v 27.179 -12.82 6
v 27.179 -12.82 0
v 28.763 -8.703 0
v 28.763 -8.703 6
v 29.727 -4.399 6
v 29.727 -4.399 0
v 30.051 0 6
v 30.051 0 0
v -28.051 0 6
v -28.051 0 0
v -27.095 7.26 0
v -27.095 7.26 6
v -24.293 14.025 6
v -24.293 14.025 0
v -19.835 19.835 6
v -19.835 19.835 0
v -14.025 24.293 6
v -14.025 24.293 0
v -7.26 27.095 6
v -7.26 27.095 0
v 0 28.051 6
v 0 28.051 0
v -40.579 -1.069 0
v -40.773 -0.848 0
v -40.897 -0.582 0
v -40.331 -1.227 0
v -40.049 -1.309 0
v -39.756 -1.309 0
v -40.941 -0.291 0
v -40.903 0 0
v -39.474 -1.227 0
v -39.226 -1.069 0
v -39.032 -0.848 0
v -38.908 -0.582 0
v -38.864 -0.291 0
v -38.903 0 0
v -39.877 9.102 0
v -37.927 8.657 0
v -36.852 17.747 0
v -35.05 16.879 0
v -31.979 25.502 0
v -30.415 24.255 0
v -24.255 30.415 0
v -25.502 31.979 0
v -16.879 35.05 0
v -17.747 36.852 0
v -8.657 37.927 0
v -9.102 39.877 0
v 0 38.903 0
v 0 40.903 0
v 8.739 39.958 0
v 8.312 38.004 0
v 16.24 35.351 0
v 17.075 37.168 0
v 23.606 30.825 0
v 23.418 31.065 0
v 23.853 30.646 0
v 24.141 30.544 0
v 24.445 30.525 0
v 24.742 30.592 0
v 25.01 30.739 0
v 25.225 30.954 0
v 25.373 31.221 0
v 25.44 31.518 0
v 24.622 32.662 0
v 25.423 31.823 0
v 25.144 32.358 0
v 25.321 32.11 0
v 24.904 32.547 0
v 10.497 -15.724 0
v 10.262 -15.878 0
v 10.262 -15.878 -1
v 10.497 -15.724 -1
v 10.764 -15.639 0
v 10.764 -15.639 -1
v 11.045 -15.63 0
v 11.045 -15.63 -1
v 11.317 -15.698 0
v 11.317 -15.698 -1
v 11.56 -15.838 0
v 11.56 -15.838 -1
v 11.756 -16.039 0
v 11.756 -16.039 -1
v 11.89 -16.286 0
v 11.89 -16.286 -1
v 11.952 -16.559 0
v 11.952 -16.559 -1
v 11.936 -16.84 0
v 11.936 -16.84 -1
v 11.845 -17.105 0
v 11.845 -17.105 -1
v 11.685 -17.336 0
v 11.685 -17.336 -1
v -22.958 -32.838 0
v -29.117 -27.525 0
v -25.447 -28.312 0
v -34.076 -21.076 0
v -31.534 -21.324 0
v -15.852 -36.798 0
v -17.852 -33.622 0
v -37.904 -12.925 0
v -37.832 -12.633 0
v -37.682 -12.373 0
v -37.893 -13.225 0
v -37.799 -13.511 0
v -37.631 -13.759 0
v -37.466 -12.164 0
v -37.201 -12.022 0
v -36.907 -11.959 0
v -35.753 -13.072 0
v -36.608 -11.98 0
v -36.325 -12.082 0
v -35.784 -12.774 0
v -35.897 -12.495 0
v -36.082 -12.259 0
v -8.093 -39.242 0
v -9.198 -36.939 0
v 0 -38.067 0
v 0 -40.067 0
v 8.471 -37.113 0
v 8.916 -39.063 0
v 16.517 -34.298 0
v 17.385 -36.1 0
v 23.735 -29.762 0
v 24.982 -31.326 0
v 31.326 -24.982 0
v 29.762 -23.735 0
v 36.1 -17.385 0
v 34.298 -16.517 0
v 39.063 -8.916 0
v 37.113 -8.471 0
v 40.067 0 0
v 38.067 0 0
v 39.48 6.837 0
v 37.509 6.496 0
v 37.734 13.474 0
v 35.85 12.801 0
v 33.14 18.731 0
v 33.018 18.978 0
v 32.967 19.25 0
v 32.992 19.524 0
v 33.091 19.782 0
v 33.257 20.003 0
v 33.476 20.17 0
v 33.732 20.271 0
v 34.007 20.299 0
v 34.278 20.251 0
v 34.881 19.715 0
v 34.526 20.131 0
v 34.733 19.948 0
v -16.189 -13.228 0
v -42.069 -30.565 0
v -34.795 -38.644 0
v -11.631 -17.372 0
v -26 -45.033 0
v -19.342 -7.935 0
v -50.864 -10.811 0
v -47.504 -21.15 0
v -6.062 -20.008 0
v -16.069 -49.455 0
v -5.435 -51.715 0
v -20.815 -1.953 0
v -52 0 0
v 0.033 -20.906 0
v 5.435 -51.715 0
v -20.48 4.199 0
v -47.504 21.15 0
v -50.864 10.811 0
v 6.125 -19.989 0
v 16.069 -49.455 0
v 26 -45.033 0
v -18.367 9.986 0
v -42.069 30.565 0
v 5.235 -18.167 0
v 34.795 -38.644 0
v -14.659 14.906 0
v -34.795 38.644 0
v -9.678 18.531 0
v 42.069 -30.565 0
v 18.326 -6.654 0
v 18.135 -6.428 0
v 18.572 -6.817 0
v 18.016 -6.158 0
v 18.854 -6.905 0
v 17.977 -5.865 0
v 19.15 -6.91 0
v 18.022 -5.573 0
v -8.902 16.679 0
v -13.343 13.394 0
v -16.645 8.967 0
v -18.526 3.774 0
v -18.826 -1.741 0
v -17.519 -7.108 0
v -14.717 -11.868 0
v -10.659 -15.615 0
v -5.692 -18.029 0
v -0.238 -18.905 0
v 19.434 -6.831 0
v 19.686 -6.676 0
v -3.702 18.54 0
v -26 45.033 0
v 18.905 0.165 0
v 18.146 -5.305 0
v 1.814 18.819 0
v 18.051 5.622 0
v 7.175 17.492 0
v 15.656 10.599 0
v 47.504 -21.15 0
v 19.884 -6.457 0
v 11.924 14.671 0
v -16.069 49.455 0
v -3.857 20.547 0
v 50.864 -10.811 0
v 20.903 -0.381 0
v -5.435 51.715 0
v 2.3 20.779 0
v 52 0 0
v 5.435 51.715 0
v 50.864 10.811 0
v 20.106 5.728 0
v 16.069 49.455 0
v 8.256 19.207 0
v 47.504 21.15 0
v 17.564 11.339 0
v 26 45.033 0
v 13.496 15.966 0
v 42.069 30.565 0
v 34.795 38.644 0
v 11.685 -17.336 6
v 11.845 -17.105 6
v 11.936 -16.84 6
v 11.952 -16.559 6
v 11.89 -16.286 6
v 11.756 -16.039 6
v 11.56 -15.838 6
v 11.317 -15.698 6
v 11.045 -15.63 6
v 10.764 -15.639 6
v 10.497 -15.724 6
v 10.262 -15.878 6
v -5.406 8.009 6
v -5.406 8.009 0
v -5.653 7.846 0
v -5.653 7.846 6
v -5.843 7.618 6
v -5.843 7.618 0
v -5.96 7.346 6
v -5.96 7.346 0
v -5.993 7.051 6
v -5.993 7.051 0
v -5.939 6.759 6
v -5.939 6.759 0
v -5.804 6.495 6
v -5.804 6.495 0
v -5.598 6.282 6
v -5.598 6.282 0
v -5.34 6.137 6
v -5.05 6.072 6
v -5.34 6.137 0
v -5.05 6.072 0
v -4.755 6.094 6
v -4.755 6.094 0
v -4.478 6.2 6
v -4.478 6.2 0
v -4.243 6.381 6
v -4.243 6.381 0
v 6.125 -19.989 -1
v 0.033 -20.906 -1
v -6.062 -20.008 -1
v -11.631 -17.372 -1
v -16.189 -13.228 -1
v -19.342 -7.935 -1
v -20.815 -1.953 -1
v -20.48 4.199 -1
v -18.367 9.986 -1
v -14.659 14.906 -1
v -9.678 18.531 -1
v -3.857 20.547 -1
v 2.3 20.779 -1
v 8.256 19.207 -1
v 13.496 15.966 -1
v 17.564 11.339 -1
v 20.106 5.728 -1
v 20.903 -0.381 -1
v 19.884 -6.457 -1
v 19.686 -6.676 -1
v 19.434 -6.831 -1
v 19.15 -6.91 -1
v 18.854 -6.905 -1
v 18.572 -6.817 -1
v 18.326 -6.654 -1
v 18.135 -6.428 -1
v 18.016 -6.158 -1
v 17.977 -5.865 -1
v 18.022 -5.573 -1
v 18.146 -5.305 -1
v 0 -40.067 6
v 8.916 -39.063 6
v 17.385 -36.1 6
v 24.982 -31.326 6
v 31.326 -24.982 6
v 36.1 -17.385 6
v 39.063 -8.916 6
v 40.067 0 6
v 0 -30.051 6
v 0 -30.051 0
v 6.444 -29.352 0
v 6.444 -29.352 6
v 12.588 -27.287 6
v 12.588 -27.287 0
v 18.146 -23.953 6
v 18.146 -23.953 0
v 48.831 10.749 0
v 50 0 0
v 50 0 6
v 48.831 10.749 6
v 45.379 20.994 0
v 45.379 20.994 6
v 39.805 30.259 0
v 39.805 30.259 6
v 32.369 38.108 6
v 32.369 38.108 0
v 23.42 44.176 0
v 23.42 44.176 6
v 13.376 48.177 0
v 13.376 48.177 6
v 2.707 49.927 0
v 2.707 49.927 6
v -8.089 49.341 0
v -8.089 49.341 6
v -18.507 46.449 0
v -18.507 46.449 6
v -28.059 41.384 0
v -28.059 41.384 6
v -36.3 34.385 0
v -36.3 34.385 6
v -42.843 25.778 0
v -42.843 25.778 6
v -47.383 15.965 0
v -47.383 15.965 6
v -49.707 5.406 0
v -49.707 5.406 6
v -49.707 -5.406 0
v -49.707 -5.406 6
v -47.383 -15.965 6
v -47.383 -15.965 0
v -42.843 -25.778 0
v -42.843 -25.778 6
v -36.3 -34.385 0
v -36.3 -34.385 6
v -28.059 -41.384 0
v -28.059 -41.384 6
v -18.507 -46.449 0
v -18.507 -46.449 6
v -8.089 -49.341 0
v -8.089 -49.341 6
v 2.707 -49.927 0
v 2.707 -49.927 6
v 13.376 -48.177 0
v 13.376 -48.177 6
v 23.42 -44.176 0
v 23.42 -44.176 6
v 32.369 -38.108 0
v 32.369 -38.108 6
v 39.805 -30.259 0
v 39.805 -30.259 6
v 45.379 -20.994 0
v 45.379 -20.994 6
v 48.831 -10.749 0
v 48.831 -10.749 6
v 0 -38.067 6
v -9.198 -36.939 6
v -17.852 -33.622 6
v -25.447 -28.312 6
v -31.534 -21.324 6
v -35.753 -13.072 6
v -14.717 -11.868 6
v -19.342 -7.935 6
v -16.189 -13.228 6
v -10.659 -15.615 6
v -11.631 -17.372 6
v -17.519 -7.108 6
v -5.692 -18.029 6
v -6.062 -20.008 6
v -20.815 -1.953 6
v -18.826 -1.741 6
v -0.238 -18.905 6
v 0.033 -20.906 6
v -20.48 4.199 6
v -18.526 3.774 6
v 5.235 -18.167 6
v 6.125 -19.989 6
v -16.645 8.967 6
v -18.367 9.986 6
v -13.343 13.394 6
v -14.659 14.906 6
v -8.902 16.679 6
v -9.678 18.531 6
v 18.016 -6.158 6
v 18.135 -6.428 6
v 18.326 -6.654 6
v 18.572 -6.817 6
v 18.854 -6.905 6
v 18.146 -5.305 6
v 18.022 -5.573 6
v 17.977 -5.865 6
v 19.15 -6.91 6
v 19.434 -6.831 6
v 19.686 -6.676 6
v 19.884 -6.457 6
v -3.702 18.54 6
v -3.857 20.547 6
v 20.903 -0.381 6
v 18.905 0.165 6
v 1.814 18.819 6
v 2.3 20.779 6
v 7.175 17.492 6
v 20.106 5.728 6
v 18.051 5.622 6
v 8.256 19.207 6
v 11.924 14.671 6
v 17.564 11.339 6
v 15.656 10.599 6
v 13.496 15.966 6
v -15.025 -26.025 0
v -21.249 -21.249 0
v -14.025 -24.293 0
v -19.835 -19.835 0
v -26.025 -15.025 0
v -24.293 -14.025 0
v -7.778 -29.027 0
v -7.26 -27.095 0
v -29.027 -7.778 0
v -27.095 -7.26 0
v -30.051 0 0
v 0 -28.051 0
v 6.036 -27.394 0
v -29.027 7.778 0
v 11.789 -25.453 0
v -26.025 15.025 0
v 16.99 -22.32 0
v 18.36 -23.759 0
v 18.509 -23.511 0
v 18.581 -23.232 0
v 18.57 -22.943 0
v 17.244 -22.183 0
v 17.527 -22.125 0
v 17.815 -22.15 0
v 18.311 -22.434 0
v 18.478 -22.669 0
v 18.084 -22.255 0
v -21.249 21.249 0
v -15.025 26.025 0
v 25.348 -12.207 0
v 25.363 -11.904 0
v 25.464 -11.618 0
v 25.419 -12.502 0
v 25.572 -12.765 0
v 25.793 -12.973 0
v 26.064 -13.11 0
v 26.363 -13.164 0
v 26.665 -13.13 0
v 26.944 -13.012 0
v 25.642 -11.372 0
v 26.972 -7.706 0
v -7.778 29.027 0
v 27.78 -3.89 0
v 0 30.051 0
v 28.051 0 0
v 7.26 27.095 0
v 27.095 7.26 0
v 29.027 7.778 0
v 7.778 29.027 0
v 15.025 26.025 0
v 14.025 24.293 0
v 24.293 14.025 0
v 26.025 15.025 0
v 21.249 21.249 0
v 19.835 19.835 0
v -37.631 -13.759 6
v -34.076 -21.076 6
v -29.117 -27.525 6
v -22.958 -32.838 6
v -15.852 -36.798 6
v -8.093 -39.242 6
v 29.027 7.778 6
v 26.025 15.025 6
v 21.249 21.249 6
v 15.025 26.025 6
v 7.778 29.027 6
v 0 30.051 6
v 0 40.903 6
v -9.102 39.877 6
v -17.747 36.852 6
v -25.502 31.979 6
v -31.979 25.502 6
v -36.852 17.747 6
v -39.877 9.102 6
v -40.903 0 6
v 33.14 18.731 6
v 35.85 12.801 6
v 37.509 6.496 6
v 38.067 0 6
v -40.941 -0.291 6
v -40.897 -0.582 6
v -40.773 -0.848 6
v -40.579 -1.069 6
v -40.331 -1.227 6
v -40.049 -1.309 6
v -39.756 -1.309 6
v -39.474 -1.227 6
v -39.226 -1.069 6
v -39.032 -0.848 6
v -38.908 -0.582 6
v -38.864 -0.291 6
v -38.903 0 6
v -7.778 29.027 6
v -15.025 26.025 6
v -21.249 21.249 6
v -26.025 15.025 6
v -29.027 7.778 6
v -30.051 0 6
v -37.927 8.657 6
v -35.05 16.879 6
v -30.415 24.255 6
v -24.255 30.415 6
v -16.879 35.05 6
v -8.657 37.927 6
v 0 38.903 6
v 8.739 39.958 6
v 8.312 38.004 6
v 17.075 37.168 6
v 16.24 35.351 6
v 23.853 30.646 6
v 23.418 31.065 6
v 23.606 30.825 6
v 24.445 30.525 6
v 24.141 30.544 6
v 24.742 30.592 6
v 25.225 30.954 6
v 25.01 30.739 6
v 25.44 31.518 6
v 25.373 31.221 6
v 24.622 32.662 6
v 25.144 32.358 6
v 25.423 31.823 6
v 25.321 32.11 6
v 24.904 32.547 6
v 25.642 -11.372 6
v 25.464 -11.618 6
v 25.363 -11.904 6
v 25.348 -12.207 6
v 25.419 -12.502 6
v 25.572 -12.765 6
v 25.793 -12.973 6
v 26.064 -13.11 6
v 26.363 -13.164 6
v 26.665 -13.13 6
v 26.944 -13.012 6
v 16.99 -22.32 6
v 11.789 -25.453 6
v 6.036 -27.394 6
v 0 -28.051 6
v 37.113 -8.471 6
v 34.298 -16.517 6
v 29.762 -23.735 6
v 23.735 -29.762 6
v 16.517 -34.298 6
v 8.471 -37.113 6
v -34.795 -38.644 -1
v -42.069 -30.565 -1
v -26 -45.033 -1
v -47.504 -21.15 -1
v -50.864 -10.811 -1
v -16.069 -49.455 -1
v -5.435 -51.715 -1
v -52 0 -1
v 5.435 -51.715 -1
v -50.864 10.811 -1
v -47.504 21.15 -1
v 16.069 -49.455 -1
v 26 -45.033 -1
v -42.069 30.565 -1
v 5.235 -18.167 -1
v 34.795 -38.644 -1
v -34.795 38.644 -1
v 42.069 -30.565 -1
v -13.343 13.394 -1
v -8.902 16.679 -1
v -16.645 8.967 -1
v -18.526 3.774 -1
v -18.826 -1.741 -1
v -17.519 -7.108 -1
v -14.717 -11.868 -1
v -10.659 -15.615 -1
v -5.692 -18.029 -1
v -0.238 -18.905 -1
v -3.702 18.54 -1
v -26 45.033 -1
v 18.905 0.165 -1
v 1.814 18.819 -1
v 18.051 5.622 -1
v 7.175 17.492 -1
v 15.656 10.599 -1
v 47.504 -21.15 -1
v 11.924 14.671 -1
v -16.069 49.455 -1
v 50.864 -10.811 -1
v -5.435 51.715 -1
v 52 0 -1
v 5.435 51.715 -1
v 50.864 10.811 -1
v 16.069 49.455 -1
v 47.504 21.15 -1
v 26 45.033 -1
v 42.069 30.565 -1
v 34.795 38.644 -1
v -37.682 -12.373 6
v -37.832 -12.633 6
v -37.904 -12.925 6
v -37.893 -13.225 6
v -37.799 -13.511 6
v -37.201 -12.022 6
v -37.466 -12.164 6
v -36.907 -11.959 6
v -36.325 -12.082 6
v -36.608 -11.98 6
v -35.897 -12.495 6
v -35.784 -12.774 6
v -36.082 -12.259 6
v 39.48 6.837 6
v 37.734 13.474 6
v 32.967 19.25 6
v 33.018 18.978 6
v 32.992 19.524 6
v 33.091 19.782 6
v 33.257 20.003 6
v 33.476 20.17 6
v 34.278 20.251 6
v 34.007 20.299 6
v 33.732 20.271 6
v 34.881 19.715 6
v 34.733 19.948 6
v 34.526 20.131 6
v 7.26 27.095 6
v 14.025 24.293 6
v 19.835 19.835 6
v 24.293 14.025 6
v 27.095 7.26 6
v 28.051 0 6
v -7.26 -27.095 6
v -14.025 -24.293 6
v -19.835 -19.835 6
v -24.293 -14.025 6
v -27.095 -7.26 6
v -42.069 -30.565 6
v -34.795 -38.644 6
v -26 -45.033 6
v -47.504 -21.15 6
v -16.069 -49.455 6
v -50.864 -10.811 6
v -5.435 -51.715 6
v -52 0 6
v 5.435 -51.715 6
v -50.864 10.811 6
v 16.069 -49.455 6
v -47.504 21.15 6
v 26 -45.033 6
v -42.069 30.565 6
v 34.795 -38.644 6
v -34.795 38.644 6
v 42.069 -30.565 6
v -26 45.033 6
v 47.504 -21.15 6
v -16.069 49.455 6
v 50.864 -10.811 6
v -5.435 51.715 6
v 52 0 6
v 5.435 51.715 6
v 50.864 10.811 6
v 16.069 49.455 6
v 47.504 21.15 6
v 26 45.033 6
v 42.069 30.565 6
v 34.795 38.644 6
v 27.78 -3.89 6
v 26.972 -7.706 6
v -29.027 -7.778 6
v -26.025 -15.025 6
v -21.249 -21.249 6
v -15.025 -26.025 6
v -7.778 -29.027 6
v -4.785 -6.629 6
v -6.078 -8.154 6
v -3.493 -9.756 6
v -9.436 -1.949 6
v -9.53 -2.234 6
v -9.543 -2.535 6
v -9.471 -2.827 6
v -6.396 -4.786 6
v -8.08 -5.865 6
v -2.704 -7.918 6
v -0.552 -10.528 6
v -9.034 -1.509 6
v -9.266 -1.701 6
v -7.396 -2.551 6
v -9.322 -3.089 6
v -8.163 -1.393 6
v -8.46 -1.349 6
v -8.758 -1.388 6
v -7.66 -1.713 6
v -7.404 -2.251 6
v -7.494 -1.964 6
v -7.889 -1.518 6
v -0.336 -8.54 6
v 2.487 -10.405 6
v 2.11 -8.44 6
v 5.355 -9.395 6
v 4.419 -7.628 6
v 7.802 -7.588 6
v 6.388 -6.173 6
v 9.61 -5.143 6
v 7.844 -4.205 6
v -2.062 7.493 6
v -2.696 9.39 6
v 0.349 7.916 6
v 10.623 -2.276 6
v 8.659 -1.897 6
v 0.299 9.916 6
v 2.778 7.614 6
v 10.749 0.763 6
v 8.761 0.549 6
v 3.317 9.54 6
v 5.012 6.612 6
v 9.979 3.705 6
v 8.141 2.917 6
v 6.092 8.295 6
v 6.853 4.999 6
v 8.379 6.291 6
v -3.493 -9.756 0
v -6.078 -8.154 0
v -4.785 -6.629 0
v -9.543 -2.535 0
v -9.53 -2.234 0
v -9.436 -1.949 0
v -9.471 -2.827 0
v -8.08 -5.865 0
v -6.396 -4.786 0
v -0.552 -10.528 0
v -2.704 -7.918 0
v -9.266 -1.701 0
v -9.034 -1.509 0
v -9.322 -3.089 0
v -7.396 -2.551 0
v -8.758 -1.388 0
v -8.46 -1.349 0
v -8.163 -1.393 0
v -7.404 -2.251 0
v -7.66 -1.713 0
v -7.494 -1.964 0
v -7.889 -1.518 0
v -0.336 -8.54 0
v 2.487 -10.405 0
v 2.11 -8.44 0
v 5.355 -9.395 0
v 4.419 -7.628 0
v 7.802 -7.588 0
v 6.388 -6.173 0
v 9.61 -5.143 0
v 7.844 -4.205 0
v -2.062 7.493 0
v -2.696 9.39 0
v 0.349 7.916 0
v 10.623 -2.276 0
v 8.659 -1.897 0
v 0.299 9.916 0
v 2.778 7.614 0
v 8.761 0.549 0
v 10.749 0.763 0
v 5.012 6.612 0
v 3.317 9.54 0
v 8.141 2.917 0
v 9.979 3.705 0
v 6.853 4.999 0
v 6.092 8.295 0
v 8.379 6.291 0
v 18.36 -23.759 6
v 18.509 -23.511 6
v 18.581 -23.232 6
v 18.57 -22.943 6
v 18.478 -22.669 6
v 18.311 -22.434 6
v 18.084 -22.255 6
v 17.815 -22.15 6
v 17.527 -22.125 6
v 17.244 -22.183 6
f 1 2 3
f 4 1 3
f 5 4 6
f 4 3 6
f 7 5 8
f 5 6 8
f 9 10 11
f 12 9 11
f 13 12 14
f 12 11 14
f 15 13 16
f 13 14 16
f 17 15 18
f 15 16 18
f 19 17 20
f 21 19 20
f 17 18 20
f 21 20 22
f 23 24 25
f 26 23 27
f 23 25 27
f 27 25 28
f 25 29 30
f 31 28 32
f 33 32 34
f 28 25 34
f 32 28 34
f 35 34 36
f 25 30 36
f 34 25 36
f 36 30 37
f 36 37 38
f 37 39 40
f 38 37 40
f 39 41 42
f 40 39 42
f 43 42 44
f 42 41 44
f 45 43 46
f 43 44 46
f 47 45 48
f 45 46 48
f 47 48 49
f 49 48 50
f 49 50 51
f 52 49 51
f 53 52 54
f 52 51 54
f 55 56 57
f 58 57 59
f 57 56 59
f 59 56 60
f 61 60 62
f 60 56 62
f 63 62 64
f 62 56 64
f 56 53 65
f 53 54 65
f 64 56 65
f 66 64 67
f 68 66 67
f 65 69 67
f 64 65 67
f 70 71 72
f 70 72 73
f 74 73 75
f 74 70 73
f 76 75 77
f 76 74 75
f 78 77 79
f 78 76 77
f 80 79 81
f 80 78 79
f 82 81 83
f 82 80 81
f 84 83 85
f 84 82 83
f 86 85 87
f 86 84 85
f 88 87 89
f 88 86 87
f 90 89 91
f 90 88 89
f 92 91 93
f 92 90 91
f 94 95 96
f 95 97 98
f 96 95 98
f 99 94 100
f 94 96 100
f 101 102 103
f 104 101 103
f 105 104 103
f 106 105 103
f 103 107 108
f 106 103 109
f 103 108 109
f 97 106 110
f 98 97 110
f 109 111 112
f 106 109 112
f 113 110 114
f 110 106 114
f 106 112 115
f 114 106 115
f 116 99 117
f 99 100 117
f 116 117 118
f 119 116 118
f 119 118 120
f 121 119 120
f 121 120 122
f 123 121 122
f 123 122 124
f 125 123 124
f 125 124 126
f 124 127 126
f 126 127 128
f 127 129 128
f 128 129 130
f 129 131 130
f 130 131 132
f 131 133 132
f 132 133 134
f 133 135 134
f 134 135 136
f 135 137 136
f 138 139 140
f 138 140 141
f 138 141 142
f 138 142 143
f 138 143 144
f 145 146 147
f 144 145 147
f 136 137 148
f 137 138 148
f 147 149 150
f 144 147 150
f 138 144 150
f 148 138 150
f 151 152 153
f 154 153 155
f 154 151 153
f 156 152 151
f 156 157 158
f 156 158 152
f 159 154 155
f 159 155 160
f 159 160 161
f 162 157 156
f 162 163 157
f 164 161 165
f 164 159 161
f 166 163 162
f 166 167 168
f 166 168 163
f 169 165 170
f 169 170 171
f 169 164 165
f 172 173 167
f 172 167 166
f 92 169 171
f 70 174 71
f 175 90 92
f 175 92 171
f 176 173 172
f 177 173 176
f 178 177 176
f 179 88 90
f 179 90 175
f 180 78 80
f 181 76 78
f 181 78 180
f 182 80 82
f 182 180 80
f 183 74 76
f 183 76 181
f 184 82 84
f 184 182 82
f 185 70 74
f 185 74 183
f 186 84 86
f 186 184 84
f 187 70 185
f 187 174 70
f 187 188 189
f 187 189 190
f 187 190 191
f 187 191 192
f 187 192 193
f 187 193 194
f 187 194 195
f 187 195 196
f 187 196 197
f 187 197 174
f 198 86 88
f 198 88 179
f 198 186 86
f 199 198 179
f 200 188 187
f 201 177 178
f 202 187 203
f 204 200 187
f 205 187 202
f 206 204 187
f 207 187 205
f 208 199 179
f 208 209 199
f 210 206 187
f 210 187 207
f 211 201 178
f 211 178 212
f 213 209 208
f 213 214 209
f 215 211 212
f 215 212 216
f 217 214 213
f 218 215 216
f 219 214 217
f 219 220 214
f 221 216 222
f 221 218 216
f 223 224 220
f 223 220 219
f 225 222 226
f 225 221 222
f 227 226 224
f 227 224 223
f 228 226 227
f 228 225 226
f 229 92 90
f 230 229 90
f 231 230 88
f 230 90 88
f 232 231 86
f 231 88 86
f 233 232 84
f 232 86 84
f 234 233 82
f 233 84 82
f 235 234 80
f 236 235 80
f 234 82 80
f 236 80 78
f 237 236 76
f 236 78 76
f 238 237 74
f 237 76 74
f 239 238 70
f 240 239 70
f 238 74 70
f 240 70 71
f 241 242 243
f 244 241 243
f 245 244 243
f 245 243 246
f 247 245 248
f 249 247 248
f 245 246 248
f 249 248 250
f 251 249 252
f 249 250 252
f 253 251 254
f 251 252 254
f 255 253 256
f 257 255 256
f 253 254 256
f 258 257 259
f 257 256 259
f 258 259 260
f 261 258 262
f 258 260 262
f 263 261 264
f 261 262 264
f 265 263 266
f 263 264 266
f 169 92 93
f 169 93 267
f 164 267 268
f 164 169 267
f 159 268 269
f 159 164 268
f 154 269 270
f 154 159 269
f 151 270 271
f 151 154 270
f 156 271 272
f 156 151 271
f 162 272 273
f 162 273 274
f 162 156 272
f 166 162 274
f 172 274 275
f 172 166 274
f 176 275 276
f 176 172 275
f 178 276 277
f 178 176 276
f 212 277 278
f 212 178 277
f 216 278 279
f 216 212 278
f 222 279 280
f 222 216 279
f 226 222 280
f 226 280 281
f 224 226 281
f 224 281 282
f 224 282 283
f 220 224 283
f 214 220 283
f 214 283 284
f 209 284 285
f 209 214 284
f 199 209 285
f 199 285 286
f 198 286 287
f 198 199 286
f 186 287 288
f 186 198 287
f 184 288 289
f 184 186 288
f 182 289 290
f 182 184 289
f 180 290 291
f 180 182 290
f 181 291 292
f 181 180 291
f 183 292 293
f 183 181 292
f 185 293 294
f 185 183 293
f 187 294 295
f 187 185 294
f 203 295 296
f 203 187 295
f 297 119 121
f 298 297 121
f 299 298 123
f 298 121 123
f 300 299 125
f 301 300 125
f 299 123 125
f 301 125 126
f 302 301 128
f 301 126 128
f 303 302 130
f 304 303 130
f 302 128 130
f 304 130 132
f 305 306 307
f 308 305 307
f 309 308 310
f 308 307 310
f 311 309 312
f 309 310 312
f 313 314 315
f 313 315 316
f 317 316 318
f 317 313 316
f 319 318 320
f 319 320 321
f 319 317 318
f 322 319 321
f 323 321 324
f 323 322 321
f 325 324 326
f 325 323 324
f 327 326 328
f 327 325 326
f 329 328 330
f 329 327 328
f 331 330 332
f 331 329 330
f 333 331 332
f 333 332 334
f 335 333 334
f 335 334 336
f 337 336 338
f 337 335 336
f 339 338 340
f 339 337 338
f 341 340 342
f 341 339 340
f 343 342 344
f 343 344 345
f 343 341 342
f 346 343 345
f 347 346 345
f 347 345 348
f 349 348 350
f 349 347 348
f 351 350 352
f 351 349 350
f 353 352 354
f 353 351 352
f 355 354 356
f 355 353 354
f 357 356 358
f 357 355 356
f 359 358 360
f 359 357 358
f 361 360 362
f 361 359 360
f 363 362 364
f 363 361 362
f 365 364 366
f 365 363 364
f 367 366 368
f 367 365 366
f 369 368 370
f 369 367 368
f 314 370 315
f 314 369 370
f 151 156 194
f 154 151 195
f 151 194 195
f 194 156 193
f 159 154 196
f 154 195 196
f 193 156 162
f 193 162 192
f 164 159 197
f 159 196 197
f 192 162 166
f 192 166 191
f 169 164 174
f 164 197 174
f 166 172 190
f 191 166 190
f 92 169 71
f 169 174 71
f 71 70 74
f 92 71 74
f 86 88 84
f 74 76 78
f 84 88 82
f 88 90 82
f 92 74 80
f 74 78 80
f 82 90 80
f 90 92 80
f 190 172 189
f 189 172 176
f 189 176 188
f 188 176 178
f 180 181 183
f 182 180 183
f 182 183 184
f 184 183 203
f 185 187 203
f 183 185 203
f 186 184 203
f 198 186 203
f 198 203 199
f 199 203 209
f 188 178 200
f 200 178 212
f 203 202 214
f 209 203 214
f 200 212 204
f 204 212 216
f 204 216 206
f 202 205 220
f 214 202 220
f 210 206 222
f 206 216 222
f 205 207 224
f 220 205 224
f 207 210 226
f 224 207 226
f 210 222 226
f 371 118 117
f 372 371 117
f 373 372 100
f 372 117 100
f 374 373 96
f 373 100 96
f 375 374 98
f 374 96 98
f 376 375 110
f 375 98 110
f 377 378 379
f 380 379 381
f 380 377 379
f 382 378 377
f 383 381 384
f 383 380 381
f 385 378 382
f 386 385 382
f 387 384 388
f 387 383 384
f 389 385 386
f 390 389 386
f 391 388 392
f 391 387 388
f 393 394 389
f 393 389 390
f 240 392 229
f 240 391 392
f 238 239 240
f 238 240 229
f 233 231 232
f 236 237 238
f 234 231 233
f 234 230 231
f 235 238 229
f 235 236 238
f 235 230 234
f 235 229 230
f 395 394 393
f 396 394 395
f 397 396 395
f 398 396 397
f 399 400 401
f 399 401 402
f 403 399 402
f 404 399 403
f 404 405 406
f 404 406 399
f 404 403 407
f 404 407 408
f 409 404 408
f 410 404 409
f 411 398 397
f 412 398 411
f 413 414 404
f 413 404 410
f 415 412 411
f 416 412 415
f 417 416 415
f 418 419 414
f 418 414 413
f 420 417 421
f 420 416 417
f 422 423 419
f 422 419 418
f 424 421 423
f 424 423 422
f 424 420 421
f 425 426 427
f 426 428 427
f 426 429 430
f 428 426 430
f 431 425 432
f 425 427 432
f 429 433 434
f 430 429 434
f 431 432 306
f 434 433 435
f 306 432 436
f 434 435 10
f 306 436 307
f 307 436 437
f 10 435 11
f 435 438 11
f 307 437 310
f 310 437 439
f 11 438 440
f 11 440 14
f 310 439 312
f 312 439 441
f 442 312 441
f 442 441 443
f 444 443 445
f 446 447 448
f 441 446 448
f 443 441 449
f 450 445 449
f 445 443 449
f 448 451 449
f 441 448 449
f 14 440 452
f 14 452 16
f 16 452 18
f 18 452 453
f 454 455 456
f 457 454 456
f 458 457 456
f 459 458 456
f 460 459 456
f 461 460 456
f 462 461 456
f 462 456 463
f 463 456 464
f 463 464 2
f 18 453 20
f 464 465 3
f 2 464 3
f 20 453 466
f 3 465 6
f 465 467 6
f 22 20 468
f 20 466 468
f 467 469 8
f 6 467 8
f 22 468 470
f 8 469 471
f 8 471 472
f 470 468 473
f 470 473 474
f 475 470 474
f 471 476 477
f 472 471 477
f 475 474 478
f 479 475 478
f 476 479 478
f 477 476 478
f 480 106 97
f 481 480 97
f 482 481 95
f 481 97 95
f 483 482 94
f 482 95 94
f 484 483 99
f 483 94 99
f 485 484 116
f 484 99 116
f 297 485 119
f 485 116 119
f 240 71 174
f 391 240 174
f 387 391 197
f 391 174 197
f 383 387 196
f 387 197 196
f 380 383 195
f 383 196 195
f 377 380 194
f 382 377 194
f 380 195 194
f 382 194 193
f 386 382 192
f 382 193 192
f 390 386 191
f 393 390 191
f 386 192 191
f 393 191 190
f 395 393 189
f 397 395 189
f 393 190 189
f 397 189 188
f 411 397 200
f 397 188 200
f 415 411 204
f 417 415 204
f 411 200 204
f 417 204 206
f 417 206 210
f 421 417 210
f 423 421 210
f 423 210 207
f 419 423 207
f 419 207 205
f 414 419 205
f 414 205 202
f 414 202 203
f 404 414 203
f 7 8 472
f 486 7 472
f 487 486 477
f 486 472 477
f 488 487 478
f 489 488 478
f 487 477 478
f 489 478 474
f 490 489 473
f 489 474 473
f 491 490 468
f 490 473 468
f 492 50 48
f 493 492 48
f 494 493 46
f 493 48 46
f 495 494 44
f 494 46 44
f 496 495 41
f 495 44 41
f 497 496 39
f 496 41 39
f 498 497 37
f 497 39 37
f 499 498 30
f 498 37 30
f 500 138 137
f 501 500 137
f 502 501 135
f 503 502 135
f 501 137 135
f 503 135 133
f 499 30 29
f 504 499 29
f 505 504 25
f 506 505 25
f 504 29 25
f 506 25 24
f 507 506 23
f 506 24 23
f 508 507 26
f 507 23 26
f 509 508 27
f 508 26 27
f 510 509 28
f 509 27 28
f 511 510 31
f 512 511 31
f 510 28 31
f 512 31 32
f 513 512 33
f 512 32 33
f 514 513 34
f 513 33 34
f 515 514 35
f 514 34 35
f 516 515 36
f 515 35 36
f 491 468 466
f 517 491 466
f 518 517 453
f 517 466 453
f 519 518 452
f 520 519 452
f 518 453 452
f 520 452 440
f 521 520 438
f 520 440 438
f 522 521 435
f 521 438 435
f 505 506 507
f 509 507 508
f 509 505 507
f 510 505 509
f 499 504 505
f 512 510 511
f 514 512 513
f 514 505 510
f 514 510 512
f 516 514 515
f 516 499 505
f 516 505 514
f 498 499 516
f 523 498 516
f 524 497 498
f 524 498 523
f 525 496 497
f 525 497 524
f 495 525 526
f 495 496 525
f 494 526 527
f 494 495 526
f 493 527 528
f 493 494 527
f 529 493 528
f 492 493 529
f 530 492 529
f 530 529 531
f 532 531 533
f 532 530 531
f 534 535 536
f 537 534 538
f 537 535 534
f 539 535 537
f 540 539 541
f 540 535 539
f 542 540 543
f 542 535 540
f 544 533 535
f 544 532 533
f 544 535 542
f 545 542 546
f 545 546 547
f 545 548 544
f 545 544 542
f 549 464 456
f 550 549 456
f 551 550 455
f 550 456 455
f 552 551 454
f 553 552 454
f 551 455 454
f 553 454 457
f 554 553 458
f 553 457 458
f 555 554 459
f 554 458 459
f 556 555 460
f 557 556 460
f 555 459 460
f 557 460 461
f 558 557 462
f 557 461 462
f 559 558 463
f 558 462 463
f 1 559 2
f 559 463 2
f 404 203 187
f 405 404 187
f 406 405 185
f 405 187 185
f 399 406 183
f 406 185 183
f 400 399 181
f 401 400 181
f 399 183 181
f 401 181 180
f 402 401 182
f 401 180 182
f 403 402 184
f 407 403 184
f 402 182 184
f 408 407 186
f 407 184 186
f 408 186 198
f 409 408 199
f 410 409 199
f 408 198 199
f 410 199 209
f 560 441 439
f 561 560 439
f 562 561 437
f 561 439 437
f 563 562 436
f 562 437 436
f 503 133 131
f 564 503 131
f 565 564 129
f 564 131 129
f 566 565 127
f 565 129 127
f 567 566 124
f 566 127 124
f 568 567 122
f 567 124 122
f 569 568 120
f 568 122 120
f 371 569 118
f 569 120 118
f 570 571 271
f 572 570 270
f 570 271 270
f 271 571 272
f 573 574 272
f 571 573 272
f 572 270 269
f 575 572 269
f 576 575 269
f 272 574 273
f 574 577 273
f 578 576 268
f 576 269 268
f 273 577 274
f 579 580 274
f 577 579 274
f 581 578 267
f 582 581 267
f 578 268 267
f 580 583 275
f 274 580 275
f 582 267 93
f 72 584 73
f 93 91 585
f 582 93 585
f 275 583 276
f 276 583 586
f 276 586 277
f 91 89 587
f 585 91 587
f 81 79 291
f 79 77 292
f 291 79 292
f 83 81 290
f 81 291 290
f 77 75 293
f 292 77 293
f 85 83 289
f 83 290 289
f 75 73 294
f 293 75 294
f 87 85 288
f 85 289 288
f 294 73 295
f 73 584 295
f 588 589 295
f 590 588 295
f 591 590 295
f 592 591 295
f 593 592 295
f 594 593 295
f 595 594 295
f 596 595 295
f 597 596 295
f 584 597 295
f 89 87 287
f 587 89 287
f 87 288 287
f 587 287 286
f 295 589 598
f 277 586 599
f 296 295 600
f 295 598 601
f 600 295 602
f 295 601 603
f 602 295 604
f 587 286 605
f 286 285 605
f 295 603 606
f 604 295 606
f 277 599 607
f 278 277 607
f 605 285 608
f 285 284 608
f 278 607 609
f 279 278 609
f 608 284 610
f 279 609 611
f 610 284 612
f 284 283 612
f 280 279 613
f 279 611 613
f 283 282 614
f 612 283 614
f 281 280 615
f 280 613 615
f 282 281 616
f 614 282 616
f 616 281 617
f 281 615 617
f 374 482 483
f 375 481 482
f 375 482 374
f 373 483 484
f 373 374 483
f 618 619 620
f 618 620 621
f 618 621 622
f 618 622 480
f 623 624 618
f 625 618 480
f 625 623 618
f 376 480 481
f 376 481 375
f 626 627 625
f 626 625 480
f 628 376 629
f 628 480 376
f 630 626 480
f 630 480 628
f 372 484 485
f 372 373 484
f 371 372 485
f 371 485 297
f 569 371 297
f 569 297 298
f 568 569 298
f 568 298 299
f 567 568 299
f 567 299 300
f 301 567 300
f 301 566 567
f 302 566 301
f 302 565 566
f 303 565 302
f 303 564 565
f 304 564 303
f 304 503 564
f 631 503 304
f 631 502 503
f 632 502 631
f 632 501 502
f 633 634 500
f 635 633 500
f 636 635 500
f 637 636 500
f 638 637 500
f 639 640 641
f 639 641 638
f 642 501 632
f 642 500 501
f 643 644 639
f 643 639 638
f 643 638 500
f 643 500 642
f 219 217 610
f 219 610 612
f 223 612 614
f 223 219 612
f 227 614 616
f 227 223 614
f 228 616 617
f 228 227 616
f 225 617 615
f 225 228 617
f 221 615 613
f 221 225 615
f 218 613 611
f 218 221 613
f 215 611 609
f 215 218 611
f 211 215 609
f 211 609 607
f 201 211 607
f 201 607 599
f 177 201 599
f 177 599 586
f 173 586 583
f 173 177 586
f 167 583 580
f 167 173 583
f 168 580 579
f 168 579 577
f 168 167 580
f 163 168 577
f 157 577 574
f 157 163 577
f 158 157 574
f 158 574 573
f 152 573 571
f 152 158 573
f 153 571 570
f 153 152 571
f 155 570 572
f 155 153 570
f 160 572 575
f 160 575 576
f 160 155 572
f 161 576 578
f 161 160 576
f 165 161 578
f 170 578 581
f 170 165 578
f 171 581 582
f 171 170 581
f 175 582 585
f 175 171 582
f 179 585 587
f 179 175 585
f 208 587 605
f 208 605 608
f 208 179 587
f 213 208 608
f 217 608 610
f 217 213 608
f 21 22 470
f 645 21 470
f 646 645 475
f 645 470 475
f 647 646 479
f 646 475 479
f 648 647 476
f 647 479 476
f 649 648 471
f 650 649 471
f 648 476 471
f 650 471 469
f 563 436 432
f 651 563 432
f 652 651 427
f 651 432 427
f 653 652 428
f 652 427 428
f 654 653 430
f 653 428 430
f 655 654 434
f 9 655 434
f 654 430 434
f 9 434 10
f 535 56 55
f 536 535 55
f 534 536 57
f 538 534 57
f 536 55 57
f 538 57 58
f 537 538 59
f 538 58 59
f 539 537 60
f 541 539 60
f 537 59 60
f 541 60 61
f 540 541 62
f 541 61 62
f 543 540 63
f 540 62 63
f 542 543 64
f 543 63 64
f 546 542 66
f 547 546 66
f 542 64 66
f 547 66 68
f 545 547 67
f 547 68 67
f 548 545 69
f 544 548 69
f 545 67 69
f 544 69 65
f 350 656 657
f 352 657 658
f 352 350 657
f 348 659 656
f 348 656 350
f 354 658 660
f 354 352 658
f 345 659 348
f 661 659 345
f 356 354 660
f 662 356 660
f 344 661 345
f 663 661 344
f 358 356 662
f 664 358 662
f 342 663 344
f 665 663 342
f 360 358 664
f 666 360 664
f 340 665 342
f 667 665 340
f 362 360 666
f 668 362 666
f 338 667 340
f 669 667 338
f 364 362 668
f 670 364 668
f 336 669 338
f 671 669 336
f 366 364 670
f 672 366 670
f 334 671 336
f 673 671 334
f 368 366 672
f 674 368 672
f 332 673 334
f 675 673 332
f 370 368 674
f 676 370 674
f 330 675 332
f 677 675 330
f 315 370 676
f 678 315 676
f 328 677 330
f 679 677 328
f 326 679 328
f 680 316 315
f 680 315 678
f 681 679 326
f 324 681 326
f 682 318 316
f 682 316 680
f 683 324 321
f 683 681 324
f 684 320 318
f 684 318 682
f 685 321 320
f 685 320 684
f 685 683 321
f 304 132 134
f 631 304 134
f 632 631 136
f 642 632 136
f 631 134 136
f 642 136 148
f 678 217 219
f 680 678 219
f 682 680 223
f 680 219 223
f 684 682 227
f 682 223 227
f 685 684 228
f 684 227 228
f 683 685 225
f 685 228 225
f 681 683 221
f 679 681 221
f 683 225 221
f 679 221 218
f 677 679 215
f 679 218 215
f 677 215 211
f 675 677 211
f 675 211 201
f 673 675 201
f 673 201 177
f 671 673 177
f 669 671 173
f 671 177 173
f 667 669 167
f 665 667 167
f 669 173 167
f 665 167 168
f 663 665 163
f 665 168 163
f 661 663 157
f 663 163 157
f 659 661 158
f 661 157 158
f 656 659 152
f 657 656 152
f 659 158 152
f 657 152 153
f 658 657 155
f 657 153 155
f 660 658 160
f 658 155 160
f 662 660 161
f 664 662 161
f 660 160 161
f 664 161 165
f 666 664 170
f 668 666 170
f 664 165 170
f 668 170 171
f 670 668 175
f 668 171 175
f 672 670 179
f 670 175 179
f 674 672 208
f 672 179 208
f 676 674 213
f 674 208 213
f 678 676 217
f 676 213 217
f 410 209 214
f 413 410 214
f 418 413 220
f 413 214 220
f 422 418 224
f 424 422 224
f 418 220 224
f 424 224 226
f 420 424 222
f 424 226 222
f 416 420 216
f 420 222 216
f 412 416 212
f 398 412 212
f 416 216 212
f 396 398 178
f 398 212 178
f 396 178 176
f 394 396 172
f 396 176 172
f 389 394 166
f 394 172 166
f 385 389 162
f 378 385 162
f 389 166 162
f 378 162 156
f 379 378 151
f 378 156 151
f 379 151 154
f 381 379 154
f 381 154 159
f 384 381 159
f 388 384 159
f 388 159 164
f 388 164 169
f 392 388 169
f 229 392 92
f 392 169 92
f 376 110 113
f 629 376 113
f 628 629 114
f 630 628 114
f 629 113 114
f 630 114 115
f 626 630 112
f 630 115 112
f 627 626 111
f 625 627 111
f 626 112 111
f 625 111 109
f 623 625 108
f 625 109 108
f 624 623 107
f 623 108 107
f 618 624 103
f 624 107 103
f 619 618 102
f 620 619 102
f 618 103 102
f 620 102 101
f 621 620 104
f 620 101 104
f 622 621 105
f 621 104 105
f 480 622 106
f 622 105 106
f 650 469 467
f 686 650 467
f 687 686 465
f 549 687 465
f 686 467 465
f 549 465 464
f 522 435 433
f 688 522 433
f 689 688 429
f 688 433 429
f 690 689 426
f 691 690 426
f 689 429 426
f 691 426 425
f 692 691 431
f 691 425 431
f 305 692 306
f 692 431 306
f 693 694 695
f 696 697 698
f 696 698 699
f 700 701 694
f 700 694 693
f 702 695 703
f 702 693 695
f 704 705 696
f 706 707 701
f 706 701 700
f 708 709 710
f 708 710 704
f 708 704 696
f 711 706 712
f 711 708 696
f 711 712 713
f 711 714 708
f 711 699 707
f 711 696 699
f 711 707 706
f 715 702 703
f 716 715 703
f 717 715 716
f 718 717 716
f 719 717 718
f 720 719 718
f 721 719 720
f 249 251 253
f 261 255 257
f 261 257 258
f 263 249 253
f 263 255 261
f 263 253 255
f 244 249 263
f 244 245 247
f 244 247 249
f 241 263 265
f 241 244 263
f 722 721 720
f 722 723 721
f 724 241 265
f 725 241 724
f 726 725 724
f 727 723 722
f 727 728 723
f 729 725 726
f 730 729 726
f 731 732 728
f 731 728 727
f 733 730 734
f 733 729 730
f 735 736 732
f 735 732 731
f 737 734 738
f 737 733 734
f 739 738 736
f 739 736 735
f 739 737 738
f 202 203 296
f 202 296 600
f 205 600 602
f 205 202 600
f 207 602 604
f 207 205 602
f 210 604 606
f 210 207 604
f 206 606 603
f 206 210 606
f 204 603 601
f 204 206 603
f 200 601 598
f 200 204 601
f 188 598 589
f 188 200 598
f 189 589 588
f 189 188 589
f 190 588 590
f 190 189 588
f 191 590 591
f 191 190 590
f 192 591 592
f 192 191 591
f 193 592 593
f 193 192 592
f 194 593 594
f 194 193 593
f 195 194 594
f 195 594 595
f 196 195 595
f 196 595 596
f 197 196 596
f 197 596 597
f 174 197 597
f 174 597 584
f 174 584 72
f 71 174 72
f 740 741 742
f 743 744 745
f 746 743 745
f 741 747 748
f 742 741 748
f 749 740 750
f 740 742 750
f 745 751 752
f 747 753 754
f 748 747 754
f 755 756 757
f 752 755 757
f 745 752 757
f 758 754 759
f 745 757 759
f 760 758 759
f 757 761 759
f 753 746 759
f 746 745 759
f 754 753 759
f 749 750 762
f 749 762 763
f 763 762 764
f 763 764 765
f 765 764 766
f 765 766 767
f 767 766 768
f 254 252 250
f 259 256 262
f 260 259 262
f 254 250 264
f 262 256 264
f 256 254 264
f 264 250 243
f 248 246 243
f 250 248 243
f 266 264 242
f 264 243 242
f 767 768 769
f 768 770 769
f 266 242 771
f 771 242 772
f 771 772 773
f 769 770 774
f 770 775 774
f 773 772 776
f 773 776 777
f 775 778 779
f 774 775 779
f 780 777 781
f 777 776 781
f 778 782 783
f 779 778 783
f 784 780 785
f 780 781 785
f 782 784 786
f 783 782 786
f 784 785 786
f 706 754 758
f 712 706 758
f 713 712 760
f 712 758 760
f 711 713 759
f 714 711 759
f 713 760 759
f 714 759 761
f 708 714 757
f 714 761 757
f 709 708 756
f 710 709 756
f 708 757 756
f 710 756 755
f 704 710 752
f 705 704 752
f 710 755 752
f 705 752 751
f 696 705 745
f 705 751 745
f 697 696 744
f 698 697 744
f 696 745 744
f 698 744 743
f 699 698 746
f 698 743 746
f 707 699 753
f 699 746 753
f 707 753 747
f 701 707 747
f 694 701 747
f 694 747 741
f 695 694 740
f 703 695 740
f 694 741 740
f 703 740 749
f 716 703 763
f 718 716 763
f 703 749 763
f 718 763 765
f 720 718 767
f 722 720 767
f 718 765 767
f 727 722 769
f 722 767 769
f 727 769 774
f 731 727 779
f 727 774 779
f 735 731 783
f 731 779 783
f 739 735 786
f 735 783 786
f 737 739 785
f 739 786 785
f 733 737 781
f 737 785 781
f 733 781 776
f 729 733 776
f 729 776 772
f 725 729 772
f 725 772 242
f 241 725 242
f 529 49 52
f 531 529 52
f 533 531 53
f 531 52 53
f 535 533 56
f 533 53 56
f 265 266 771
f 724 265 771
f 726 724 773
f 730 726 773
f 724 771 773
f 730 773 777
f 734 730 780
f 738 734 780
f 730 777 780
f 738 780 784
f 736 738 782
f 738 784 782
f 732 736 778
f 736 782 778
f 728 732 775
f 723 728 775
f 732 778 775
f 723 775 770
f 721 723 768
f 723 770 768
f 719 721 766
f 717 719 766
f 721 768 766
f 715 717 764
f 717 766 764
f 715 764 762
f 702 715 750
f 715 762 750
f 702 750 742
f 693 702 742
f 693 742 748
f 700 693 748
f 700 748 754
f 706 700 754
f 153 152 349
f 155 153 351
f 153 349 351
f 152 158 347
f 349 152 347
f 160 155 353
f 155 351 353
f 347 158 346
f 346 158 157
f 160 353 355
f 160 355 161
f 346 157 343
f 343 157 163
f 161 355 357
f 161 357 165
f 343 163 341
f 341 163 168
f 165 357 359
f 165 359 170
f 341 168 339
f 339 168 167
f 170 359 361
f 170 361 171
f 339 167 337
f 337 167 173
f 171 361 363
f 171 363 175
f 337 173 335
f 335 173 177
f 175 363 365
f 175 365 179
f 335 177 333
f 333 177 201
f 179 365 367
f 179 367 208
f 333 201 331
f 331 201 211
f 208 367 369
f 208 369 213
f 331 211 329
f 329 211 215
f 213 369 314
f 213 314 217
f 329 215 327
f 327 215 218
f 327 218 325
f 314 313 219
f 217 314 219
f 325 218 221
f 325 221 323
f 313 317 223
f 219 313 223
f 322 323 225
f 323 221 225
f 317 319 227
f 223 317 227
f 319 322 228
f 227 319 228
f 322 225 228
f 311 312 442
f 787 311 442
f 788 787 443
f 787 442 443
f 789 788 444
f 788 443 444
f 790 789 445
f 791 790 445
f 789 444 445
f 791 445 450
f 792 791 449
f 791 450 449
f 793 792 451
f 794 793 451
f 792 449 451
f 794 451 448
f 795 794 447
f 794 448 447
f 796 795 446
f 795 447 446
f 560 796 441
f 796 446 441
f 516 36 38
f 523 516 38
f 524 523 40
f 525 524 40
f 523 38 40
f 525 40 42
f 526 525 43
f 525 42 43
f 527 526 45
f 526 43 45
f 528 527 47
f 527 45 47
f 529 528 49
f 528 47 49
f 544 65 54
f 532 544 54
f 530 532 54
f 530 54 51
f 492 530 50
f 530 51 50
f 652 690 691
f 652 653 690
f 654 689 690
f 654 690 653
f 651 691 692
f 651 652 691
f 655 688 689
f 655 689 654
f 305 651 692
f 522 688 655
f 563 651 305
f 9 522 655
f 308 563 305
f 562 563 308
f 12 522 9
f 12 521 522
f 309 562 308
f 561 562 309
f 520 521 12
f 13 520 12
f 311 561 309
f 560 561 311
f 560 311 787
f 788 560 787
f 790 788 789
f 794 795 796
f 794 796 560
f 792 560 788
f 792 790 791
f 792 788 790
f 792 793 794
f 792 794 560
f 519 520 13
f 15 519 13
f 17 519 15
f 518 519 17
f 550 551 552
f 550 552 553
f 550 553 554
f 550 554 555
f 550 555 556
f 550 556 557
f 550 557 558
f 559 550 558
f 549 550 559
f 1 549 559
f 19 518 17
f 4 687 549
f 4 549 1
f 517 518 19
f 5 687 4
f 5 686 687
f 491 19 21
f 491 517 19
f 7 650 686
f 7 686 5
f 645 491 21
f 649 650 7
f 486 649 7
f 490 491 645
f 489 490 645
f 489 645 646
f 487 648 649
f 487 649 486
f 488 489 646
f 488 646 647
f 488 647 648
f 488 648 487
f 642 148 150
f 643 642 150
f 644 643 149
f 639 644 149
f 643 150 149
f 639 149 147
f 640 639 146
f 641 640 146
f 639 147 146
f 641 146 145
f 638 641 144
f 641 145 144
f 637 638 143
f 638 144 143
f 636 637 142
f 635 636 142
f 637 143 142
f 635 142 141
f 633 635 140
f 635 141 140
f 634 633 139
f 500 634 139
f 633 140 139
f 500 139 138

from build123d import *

# Parameters (mm, degrees)
F0_R     = 52
F0_R_2   = 50
F1_DEPTH = 6
F2_R     = 52
F3_DEPTH = 1


with BuildPart() as f1:
    # F0 (on Top) → F1 (new body)
    with BuildSketch(Plane.XY):
        Circle(F0_R)
        Circle(F0_R_2, mode=Mode.SUBTRACT)
        with BuildLine():
            ThreePointArc((-38.902503, 0), (-27.508223, 27.508223), (0, 38.902503))
            ThreePointArc((0, 38.902503), (12.347381, 36.891013), (23.417898, 31.064558))
            ThreePointArc((23.417898, 31.064558), (25.225396, 30.954294), (24.621825, 32.661605))
            ThreePointArc((24.621825, 32.661605), (12.982167, 38.787602), (0, 40.902503))
            ThreePointArc((0, 40.902503), (-28.922437, 28.922437), (-40.902503, 0))
            ThreePointArc((-40.902503, 0), (-39.902503, -1.319596), (-38.902503, 0))
        make_face()
        with BuildLine():
            ThreePointArc((30.050792, 0), (21.249119, 21.249119), (0, 30.050792))
            ThreePointArc((0, 30.050792), (-21.249119, 21.249119), (-30.050792, 0))
            ThreePointArc((-30.050792, 0), (-21.249119, -21.249119), (0, -30.050792))
            ThreePointArc((0, -30.050792), (9.57175, -28.485641), (18.146439, -23.953223))
            ThreePointArc((18.146439, -23.953223), (18.402873, -22.545498), (16.989826, -22.320232))
            ThreePointArc((16.989826, -22.320232), (8.96512, -26.579571), (0, -28.050792))
            ThreePointArc((0, -28.050792), (-19.834906, -19.834906), (-28.050792, 0))
            ThreePointArc((-28.050792, 0), (-19.834906, 19.834906), (0, 28.050792))
            ThreePointArc((0, 28.050792), (19.834906, 19.834906), (28.050792, 0))
            ThreePointArc((28.050792, 0), (27.442078, -5.811997), (25.642354, -11.371748))
            ThreePointArc((25.642354, -11.371748), (25.67486, -12.876808), (27.179184, -12.819597))
            ThreePointArc((27.179184, -12.819597), (29.324104, -6.568642), (30.050792, 0))
        make_face()
        with BuildLine():
            ThreePointArc((10.262292, -15.878489), (-15.156229, 11.301759), (18.146439, -5.30545))
            ThreePointArc((18.146439, -5.30545), (18.443205, -6.744135), (19.883895, -6.457259))
            ThreePointArc((19.883895, -6.457259), (-16.695347, 12.58296), (11.685061, -17.335652))
            ThreePointArc((11.685061, -17.335652), (11.66527, -15.931801), (10.262292, -15.878489))
        make_face()
        with BuildLine():
            ThreePointArc((-7.395882, -2.551486), (-8.758352, -1.388365), (-9.322391, -3.088669))
            ThreePointArc((-9.322391, -3.088669), (10.22344, -3.747243), (-5.40562, 8.008849))
            ThreePointArc((-5.40562, 8.008849), (-5.803945, 6.495381), (-4.243093, 6.381418))
            ThreePointArc((-4.243093, 6.381418), (8.33746, -3.081603), (-7.395882, -2.551486))
        make_face()
        with BuildLine():
            ThreePointArc((0, -38.067461), (-21.811634, -31.199107), (-35.752501, -13.0725))
            ThreePointArc((-35.752501, -13.0725), (-37.201245, -12.0223), (-37.630877, -13.759307))
            ThreePointArc((-37.630877, -13.759307), (-22.95758, -32.838255), (0, -40.067461))
            ThreePointArc((0, -40.067461), (28.331974, -28.331974), (40.067461, 0))
            ThreePointArc((40.067461, 0), (38.749221, 10.193101), (34.881243, 19.715485))
            ThreePointArc((34.881243, 19.715485), (33.475693, 20.169943), (33.140117, 18.731371))
            ThreePointArc((33.140117, 18.731371), (36.815022, 9.684304), (38.067461, 0))
            ThreePointArc((38.067461, 0), (26.91776, -26.91776), (0, -38.067461))
        make_face()
    extrude(amount=F1_DEPTH)


with BuildPart() as f3:
    # F2 (on Top) → F3 (new body)
    with BuildSketch(Plane.XY):
        Circle(F2_R)
        with BuildLine():
            ThreePointArc((11.685061, -17.335652), (-16.695347, 12.58296), (19.883895, -6.457259))
            ThreePointArc((19.883895, -6.457259), (18.443205, -6.744135), (18.146439, -5.30545))
            ThreePointArc((18.146439, -5.30545), (-15.156229, 11.301759), (10.262292, -15.878489))
            ThreePointArc((10.262292, -15.878489), (11.66527, -15.931801), (11.685061, -17.335652))
        make_face(mode=Mode.SUBTRACT)
    extrude(amount=-F3_DEPTH)


solid = Compound([f1.part, f3.part])
